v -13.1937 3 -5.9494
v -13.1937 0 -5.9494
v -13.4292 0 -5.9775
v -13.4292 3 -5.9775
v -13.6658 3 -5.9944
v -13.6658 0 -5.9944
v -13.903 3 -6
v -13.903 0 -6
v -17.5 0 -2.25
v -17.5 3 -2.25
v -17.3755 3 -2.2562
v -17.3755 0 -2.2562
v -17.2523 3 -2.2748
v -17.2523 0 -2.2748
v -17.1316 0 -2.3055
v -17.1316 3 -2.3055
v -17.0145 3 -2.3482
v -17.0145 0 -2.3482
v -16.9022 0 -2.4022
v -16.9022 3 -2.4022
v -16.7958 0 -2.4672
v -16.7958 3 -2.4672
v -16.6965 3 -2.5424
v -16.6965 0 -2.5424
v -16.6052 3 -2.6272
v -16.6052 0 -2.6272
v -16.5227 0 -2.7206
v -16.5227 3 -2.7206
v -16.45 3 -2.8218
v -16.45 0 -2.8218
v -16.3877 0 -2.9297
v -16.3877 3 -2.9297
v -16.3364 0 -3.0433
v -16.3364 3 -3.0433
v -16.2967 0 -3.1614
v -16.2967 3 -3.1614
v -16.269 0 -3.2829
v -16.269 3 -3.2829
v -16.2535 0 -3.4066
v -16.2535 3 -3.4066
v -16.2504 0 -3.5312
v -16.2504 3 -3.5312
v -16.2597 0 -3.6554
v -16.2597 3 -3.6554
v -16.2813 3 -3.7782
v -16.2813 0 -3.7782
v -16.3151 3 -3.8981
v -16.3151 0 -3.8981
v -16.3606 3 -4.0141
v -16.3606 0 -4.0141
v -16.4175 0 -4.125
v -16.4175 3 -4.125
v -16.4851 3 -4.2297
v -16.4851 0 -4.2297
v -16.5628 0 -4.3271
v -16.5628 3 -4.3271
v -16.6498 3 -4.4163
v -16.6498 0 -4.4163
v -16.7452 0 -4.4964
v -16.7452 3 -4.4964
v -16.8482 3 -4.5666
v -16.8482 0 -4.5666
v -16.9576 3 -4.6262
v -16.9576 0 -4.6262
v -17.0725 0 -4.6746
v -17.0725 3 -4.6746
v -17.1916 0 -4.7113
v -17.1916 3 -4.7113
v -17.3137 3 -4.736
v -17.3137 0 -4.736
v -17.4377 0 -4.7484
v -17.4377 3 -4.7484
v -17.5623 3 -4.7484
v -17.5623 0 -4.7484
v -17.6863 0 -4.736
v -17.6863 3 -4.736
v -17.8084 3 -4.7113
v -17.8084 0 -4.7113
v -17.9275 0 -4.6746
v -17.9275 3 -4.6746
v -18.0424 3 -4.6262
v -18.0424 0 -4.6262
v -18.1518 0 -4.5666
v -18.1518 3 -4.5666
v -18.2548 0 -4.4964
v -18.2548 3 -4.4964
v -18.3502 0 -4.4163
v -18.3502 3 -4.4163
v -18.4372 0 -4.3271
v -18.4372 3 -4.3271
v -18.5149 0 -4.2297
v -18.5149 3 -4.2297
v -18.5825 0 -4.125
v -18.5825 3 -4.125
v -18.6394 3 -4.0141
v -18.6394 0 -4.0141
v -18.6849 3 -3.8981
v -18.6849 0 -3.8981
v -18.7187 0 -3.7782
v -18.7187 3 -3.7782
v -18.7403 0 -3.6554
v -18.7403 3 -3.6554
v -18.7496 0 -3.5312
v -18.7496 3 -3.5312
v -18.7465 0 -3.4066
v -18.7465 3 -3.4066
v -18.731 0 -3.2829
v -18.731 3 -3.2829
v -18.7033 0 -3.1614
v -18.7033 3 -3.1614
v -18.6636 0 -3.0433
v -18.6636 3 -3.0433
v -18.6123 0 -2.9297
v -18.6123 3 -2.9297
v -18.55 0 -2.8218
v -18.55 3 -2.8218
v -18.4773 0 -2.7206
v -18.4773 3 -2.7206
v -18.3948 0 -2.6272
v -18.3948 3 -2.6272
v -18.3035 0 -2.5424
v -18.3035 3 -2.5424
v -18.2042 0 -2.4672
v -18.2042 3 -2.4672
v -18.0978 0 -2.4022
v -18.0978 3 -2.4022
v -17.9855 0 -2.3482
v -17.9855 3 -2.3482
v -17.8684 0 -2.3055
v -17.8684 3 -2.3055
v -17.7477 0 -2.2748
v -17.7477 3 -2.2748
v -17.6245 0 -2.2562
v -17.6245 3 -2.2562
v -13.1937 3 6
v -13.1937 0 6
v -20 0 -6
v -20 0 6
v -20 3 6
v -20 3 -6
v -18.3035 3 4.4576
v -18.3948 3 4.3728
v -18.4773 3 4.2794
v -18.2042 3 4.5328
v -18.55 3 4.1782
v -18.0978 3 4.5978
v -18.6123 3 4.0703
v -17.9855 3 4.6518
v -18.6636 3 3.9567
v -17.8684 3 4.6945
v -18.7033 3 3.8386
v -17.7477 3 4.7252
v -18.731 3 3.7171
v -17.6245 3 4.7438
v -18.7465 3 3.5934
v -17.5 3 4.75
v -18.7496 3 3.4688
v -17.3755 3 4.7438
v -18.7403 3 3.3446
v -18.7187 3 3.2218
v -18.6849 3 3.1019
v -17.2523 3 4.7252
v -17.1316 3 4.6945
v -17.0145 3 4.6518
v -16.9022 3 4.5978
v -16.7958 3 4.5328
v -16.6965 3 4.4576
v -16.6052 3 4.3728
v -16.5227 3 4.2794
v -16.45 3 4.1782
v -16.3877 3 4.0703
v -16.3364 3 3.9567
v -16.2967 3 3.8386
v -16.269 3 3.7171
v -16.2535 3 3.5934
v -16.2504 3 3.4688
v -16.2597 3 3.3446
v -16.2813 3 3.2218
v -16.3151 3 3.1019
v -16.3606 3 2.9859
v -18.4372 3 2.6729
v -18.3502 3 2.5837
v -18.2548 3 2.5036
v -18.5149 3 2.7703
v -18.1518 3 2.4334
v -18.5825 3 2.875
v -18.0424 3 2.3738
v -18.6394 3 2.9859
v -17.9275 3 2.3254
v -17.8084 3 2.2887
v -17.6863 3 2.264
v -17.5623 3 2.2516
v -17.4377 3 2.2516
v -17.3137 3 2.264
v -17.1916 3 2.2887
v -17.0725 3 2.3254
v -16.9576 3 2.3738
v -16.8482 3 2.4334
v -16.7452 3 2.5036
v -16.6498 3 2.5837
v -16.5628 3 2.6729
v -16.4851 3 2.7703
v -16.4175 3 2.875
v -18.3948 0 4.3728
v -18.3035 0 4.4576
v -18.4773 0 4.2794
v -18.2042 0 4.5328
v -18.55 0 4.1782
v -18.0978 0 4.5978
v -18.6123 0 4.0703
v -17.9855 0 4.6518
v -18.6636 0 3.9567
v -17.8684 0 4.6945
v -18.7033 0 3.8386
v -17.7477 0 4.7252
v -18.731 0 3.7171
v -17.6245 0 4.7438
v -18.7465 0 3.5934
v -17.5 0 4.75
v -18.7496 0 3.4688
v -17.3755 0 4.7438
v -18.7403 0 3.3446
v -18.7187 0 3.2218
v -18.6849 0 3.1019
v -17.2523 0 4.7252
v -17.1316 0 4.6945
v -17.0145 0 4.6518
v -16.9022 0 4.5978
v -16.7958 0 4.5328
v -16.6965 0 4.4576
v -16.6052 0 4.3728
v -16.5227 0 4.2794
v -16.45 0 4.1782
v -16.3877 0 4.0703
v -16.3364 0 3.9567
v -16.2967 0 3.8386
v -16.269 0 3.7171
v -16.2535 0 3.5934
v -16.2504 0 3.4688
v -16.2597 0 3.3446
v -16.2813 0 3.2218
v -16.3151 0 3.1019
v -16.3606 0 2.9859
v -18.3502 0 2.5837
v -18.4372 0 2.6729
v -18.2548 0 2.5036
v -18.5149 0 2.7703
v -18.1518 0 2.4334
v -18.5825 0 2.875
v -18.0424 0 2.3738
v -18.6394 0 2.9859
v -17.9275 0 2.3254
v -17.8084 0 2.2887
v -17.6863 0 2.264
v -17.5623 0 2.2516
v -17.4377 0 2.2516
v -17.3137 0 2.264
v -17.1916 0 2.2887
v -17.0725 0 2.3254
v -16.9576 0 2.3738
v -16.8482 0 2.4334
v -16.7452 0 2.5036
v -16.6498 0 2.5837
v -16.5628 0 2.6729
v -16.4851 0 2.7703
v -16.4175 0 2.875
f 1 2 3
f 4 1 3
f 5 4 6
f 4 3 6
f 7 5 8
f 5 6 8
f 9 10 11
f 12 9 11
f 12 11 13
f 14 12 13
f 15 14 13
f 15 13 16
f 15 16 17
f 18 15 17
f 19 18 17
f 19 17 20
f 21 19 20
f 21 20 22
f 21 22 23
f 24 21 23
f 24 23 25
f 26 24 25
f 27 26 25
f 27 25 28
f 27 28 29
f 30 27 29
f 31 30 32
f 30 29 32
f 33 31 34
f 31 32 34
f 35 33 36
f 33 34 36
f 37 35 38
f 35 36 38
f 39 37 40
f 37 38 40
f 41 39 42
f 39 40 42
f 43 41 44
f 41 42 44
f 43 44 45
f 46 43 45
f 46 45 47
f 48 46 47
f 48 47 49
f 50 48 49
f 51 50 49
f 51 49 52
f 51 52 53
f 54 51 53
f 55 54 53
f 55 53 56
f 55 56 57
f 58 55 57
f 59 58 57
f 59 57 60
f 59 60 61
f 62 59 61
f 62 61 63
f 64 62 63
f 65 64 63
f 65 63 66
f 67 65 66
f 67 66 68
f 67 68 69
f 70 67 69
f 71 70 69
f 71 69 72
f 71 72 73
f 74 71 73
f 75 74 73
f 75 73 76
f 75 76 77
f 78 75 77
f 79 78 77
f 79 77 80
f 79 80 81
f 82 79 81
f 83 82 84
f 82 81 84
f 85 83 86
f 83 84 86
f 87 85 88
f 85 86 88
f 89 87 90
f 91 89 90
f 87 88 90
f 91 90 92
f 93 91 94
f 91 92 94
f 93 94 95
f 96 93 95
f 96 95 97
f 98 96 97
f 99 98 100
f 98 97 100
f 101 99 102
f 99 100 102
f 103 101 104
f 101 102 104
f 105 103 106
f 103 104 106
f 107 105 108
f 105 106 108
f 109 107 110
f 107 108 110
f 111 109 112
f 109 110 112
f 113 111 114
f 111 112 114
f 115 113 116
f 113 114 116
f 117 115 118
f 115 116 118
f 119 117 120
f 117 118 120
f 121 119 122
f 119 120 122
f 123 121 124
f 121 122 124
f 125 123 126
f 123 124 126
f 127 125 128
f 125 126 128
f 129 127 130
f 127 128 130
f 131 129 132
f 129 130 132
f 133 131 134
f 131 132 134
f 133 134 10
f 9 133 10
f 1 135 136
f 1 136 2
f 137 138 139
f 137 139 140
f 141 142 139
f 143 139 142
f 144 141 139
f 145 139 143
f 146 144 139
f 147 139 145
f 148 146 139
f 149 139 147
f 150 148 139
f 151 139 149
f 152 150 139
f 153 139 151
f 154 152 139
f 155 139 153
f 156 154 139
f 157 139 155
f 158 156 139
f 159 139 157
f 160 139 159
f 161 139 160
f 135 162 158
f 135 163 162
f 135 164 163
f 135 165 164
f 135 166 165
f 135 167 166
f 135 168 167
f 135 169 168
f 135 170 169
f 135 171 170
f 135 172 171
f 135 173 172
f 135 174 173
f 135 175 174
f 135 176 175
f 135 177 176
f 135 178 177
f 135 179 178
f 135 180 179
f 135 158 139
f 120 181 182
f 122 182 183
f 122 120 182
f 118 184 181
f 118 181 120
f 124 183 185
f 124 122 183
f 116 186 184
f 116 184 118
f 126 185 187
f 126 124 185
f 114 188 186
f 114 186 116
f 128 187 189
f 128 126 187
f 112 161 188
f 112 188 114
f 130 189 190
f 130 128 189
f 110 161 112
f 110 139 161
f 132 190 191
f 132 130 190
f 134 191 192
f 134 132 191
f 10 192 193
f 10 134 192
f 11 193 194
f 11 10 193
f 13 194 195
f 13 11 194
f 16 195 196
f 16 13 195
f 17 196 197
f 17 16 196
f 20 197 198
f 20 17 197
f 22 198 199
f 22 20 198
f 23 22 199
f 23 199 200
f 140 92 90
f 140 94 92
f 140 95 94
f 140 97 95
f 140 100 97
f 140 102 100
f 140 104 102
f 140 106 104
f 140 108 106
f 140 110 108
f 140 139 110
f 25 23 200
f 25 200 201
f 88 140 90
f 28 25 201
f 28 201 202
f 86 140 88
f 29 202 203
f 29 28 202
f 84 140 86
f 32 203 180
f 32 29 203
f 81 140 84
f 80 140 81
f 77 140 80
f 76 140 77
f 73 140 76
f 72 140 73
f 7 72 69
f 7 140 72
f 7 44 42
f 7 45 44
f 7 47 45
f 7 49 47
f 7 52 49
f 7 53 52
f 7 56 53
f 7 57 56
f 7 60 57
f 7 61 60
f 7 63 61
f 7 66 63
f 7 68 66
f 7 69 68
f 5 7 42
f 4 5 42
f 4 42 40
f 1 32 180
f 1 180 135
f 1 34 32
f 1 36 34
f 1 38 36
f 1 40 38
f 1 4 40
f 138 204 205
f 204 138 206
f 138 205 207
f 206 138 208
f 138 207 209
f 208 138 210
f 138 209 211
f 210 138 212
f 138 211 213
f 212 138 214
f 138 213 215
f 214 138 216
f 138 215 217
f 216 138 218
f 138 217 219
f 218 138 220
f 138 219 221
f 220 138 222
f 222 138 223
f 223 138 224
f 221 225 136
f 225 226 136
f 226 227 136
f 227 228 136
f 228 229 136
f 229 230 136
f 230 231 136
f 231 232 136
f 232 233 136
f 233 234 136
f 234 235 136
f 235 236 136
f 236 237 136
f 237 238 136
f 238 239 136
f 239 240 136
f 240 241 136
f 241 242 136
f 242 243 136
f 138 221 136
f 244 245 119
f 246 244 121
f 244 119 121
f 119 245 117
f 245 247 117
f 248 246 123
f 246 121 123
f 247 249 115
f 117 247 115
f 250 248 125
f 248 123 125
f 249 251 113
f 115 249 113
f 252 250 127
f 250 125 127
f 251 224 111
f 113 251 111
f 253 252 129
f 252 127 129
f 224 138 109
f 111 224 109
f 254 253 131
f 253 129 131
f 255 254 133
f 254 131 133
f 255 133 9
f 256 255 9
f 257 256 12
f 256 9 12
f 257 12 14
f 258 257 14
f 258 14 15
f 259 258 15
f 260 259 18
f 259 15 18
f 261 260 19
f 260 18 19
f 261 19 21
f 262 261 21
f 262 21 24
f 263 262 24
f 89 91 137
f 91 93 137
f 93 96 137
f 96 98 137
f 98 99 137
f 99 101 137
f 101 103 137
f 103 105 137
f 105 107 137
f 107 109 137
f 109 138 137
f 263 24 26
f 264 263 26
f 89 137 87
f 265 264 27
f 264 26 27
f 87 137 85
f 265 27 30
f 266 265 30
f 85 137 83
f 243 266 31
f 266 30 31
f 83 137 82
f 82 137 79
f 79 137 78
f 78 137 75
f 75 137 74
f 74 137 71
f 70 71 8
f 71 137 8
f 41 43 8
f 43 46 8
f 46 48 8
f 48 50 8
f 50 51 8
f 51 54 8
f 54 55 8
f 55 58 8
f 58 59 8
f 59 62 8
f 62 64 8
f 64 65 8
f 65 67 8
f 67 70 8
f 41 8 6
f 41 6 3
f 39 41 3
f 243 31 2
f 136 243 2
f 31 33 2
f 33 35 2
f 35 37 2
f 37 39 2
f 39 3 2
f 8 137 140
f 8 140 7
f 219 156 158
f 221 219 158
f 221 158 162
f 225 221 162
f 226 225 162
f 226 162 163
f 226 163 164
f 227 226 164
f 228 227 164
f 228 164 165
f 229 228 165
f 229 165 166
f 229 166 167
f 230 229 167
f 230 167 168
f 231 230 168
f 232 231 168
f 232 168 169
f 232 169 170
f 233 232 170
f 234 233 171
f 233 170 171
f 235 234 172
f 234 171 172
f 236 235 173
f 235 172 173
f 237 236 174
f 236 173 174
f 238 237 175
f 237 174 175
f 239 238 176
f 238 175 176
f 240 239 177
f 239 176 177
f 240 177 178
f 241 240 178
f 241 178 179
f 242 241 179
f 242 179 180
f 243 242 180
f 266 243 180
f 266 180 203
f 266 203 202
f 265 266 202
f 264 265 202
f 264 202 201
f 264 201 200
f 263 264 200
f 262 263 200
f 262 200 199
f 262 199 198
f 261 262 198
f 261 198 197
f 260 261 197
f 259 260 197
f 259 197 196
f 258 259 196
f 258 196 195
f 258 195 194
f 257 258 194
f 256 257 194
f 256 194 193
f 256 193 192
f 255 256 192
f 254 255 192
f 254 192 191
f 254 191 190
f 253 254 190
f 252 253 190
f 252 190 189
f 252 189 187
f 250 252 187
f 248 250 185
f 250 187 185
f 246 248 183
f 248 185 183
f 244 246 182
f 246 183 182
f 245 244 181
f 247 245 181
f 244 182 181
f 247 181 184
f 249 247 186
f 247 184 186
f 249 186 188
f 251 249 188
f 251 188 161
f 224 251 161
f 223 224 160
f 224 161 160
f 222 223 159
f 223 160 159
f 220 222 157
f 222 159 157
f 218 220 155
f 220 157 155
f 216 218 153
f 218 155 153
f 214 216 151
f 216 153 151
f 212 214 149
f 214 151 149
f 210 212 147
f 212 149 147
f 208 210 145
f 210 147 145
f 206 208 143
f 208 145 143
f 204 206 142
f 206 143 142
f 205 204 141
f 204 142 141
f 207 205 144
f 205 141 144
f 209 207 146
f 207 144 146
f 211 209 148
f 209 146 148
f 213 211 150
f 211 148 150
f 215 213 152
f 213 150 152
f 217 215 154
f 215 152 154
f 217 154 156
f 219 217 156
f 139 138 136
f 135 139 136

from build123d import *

# Parameters (mm, degrees)
SKETCH1_W           = 40
SKETCH1_H           = 12
BOSS_EXTRUDE1_DEPTH = 3
SKETCH3_R           = 1.25
CUT_EXTRUDE2_DEPTH  = 22.09502311
CUT_EXTRUDE3_DEPTH  = 10
FILLET2_R           = 5
FILLET3_R           = 1
FILLET4_R           = 5
FILLET5_R           = 5
SKETCH6_W           = 35.954210482
SKETCH6_H           = 25.866097198
CUT_EXTRUDE4_DEPTH  = 10


with BuildPart() as part:
    # Sketch1 → Boss-Extrude1 (new body)
    with BuildSketch(Plane(origin=(0, 0, 0), x_dir=(1, 0, 0), z_dir=(0, 1, 0))):
        Rectangle(SKETCH1_W, SKETCH1_H)
    extrude(amount=BOSS_EXTRUDE1_DEPTH)

    # Sketch3 → Cut-Extrude2 (cut, through all)
    with BuildSketch(Plane(origin=(0, 3, 0), x_dir=(1, 0, 0), z_dir=(0, 1, 0))):
        with Locations(Location((-17.5, 3.5, 0), (0, 0, 270))):
            Circle(SKETCH3_R)
        with Locations(Location((-17.5, -3.5, 0), (0, 0, 270))):
            Circle(SKETCH3_R)
    extrude(amount=-CUT_EXTRUDE2_DEPTH, mode=Mode.SUBTRACT)

    # Sketch5 → Cut-Extrude3 (cut)
    with BuildSketch(Plane(origin=(0, 3, 0), x_dir=(1, 0, 0), z_dir=(0, 1, 0))):
        with BuildLine():
            Line((-13.458222524, 6), (20, 0))
            Line((20, 0), (20, -6))
            Line((20, -6), (17.030073052, -6))
            ThreePointArc((17.030073052, -6), (7.671541519, -2.617819669), (-2.144608615, -4.250134828))
            Line((-2.144608615, -4.250134828), (-6.569653649, -6))
            Line((-6.569653649, -6), (-13.458222524, -6))
            Line((-13.458222524, -6), (-13.458222524, -10.237178745))
            Line((-13.458222524, -10.237178745), (26.023482417, -9.726914384))
            Line((26.023482417, -9.726914384), (26.023482417, 8.477274399))
            Line((26.023482417, 8.477274399), (-13.458222524, 8.477274399))
            Line((-13.458222524, 8.477274399), (-13.458222524, 6))
        make_face()
    extrude(amount=-CUT_EXTRUDE3_DEPTH, mode=Mode.SUBTRACT)

    # Fillet2
    # the kernel refuses this fillet: 5 mm, written as the material it takes off along each edge
    with BuildSketch(Plane(origin=(-6.569653649, 5.381801612, 6), x_dir=(-1, 0, 0), z_dir=(0, -1, 0))) as fillet2_piece_1:
        with BuildLine():
            CenterArc((FILLET2_R * 0.190544128998, FILLET2_R), FILLET2_R, 248.423891744, 21.576108256)
            Line((-FILLET2_R * 0.17719268457, FILLET2_R * 0.0700700908417), (0, 0))
            Line((0, 0), (FILLET2_R * 0.190544128998, 0))
        make_face()
    extrude(amount=7.763603225, mode=Mode.SUBTRACT)
    with BuildSketch(Plane(origin=(-2.144608615, 3.259446384, 4.250134828), x_dir=(-0.9299299091583175, 0, 0.36773681356753396), z_dir=(0, -1, 0))) as fillet2_piece_2:
        with BuildLine():
            CenterArc((0.103778554, 5), FILLET2_R, 267.749266862, 2.250733138)
            ThreePointArc((-0.092584454, 0.003857331), (-0.046289955, 0.001983199), (0, 0))
            Line((0, 0), (0.103778554, 0))
        make_face()
    extrude(amount=3.518892769, mode=Mode.SUBTRACT)
    with BuildSketch(Plane(origin=(17.030073052, 6.64587884, 6), x_dir=(1, 0, 0), z_dir=(0, -1, 0))) as fillet2_piece_3:
        with BuildLine():
            CenterArc((1.458351536, -5), FILLET2_R, 90, 30.730822568)
            ThreePointArc((-1.096675494, -0.70211251), (-0.542524687, -0.360136055), (0, 0))
            Line((0, 0), (1.458351536, 0))
        make_face()
    extrude(amount=10.291757681, mode=Mode.SUBTRACT)

    # Fillet3
    fillet3_edges = [part.edges().sort_by_distance(p)[0] for p in [
        (20, 1.5, 6),
    ]]
    fillet(fillet3_edges, radius=FILLET3_R)

    # Fillet4
    fillet4_edges = [part.edges().sort_by_distance(p)[0] for p in [
        (20, 1.5, 0),
    ]]
    fillet(fillet4_edges, radius=FILLET4_R)

    # Fillet5
    fillet5_edges = [part.edges().sort_by_distance(p)[0] for p in [
        (-13.458222524, 1.5, -6),
    ]]
    fillet(fillet5_edges, radius=FILLET5_R)

    # Sketch6 → Cut-Extrude4 (cut)
    with BuildSketch(Plane(origin=(0, 3, 0), x_dir=(1, 0, 0), z_dir=(0, 1, 0))):
        with Locations((4.783435461, -3.359387953)):
            Rectangle(SKETCH6_W, SKETCH6_H)
    extrude(amount=-CUT_EXTRUDE4_DEPTH, mode=Mode.SUBTRACT)


solid = part.part
